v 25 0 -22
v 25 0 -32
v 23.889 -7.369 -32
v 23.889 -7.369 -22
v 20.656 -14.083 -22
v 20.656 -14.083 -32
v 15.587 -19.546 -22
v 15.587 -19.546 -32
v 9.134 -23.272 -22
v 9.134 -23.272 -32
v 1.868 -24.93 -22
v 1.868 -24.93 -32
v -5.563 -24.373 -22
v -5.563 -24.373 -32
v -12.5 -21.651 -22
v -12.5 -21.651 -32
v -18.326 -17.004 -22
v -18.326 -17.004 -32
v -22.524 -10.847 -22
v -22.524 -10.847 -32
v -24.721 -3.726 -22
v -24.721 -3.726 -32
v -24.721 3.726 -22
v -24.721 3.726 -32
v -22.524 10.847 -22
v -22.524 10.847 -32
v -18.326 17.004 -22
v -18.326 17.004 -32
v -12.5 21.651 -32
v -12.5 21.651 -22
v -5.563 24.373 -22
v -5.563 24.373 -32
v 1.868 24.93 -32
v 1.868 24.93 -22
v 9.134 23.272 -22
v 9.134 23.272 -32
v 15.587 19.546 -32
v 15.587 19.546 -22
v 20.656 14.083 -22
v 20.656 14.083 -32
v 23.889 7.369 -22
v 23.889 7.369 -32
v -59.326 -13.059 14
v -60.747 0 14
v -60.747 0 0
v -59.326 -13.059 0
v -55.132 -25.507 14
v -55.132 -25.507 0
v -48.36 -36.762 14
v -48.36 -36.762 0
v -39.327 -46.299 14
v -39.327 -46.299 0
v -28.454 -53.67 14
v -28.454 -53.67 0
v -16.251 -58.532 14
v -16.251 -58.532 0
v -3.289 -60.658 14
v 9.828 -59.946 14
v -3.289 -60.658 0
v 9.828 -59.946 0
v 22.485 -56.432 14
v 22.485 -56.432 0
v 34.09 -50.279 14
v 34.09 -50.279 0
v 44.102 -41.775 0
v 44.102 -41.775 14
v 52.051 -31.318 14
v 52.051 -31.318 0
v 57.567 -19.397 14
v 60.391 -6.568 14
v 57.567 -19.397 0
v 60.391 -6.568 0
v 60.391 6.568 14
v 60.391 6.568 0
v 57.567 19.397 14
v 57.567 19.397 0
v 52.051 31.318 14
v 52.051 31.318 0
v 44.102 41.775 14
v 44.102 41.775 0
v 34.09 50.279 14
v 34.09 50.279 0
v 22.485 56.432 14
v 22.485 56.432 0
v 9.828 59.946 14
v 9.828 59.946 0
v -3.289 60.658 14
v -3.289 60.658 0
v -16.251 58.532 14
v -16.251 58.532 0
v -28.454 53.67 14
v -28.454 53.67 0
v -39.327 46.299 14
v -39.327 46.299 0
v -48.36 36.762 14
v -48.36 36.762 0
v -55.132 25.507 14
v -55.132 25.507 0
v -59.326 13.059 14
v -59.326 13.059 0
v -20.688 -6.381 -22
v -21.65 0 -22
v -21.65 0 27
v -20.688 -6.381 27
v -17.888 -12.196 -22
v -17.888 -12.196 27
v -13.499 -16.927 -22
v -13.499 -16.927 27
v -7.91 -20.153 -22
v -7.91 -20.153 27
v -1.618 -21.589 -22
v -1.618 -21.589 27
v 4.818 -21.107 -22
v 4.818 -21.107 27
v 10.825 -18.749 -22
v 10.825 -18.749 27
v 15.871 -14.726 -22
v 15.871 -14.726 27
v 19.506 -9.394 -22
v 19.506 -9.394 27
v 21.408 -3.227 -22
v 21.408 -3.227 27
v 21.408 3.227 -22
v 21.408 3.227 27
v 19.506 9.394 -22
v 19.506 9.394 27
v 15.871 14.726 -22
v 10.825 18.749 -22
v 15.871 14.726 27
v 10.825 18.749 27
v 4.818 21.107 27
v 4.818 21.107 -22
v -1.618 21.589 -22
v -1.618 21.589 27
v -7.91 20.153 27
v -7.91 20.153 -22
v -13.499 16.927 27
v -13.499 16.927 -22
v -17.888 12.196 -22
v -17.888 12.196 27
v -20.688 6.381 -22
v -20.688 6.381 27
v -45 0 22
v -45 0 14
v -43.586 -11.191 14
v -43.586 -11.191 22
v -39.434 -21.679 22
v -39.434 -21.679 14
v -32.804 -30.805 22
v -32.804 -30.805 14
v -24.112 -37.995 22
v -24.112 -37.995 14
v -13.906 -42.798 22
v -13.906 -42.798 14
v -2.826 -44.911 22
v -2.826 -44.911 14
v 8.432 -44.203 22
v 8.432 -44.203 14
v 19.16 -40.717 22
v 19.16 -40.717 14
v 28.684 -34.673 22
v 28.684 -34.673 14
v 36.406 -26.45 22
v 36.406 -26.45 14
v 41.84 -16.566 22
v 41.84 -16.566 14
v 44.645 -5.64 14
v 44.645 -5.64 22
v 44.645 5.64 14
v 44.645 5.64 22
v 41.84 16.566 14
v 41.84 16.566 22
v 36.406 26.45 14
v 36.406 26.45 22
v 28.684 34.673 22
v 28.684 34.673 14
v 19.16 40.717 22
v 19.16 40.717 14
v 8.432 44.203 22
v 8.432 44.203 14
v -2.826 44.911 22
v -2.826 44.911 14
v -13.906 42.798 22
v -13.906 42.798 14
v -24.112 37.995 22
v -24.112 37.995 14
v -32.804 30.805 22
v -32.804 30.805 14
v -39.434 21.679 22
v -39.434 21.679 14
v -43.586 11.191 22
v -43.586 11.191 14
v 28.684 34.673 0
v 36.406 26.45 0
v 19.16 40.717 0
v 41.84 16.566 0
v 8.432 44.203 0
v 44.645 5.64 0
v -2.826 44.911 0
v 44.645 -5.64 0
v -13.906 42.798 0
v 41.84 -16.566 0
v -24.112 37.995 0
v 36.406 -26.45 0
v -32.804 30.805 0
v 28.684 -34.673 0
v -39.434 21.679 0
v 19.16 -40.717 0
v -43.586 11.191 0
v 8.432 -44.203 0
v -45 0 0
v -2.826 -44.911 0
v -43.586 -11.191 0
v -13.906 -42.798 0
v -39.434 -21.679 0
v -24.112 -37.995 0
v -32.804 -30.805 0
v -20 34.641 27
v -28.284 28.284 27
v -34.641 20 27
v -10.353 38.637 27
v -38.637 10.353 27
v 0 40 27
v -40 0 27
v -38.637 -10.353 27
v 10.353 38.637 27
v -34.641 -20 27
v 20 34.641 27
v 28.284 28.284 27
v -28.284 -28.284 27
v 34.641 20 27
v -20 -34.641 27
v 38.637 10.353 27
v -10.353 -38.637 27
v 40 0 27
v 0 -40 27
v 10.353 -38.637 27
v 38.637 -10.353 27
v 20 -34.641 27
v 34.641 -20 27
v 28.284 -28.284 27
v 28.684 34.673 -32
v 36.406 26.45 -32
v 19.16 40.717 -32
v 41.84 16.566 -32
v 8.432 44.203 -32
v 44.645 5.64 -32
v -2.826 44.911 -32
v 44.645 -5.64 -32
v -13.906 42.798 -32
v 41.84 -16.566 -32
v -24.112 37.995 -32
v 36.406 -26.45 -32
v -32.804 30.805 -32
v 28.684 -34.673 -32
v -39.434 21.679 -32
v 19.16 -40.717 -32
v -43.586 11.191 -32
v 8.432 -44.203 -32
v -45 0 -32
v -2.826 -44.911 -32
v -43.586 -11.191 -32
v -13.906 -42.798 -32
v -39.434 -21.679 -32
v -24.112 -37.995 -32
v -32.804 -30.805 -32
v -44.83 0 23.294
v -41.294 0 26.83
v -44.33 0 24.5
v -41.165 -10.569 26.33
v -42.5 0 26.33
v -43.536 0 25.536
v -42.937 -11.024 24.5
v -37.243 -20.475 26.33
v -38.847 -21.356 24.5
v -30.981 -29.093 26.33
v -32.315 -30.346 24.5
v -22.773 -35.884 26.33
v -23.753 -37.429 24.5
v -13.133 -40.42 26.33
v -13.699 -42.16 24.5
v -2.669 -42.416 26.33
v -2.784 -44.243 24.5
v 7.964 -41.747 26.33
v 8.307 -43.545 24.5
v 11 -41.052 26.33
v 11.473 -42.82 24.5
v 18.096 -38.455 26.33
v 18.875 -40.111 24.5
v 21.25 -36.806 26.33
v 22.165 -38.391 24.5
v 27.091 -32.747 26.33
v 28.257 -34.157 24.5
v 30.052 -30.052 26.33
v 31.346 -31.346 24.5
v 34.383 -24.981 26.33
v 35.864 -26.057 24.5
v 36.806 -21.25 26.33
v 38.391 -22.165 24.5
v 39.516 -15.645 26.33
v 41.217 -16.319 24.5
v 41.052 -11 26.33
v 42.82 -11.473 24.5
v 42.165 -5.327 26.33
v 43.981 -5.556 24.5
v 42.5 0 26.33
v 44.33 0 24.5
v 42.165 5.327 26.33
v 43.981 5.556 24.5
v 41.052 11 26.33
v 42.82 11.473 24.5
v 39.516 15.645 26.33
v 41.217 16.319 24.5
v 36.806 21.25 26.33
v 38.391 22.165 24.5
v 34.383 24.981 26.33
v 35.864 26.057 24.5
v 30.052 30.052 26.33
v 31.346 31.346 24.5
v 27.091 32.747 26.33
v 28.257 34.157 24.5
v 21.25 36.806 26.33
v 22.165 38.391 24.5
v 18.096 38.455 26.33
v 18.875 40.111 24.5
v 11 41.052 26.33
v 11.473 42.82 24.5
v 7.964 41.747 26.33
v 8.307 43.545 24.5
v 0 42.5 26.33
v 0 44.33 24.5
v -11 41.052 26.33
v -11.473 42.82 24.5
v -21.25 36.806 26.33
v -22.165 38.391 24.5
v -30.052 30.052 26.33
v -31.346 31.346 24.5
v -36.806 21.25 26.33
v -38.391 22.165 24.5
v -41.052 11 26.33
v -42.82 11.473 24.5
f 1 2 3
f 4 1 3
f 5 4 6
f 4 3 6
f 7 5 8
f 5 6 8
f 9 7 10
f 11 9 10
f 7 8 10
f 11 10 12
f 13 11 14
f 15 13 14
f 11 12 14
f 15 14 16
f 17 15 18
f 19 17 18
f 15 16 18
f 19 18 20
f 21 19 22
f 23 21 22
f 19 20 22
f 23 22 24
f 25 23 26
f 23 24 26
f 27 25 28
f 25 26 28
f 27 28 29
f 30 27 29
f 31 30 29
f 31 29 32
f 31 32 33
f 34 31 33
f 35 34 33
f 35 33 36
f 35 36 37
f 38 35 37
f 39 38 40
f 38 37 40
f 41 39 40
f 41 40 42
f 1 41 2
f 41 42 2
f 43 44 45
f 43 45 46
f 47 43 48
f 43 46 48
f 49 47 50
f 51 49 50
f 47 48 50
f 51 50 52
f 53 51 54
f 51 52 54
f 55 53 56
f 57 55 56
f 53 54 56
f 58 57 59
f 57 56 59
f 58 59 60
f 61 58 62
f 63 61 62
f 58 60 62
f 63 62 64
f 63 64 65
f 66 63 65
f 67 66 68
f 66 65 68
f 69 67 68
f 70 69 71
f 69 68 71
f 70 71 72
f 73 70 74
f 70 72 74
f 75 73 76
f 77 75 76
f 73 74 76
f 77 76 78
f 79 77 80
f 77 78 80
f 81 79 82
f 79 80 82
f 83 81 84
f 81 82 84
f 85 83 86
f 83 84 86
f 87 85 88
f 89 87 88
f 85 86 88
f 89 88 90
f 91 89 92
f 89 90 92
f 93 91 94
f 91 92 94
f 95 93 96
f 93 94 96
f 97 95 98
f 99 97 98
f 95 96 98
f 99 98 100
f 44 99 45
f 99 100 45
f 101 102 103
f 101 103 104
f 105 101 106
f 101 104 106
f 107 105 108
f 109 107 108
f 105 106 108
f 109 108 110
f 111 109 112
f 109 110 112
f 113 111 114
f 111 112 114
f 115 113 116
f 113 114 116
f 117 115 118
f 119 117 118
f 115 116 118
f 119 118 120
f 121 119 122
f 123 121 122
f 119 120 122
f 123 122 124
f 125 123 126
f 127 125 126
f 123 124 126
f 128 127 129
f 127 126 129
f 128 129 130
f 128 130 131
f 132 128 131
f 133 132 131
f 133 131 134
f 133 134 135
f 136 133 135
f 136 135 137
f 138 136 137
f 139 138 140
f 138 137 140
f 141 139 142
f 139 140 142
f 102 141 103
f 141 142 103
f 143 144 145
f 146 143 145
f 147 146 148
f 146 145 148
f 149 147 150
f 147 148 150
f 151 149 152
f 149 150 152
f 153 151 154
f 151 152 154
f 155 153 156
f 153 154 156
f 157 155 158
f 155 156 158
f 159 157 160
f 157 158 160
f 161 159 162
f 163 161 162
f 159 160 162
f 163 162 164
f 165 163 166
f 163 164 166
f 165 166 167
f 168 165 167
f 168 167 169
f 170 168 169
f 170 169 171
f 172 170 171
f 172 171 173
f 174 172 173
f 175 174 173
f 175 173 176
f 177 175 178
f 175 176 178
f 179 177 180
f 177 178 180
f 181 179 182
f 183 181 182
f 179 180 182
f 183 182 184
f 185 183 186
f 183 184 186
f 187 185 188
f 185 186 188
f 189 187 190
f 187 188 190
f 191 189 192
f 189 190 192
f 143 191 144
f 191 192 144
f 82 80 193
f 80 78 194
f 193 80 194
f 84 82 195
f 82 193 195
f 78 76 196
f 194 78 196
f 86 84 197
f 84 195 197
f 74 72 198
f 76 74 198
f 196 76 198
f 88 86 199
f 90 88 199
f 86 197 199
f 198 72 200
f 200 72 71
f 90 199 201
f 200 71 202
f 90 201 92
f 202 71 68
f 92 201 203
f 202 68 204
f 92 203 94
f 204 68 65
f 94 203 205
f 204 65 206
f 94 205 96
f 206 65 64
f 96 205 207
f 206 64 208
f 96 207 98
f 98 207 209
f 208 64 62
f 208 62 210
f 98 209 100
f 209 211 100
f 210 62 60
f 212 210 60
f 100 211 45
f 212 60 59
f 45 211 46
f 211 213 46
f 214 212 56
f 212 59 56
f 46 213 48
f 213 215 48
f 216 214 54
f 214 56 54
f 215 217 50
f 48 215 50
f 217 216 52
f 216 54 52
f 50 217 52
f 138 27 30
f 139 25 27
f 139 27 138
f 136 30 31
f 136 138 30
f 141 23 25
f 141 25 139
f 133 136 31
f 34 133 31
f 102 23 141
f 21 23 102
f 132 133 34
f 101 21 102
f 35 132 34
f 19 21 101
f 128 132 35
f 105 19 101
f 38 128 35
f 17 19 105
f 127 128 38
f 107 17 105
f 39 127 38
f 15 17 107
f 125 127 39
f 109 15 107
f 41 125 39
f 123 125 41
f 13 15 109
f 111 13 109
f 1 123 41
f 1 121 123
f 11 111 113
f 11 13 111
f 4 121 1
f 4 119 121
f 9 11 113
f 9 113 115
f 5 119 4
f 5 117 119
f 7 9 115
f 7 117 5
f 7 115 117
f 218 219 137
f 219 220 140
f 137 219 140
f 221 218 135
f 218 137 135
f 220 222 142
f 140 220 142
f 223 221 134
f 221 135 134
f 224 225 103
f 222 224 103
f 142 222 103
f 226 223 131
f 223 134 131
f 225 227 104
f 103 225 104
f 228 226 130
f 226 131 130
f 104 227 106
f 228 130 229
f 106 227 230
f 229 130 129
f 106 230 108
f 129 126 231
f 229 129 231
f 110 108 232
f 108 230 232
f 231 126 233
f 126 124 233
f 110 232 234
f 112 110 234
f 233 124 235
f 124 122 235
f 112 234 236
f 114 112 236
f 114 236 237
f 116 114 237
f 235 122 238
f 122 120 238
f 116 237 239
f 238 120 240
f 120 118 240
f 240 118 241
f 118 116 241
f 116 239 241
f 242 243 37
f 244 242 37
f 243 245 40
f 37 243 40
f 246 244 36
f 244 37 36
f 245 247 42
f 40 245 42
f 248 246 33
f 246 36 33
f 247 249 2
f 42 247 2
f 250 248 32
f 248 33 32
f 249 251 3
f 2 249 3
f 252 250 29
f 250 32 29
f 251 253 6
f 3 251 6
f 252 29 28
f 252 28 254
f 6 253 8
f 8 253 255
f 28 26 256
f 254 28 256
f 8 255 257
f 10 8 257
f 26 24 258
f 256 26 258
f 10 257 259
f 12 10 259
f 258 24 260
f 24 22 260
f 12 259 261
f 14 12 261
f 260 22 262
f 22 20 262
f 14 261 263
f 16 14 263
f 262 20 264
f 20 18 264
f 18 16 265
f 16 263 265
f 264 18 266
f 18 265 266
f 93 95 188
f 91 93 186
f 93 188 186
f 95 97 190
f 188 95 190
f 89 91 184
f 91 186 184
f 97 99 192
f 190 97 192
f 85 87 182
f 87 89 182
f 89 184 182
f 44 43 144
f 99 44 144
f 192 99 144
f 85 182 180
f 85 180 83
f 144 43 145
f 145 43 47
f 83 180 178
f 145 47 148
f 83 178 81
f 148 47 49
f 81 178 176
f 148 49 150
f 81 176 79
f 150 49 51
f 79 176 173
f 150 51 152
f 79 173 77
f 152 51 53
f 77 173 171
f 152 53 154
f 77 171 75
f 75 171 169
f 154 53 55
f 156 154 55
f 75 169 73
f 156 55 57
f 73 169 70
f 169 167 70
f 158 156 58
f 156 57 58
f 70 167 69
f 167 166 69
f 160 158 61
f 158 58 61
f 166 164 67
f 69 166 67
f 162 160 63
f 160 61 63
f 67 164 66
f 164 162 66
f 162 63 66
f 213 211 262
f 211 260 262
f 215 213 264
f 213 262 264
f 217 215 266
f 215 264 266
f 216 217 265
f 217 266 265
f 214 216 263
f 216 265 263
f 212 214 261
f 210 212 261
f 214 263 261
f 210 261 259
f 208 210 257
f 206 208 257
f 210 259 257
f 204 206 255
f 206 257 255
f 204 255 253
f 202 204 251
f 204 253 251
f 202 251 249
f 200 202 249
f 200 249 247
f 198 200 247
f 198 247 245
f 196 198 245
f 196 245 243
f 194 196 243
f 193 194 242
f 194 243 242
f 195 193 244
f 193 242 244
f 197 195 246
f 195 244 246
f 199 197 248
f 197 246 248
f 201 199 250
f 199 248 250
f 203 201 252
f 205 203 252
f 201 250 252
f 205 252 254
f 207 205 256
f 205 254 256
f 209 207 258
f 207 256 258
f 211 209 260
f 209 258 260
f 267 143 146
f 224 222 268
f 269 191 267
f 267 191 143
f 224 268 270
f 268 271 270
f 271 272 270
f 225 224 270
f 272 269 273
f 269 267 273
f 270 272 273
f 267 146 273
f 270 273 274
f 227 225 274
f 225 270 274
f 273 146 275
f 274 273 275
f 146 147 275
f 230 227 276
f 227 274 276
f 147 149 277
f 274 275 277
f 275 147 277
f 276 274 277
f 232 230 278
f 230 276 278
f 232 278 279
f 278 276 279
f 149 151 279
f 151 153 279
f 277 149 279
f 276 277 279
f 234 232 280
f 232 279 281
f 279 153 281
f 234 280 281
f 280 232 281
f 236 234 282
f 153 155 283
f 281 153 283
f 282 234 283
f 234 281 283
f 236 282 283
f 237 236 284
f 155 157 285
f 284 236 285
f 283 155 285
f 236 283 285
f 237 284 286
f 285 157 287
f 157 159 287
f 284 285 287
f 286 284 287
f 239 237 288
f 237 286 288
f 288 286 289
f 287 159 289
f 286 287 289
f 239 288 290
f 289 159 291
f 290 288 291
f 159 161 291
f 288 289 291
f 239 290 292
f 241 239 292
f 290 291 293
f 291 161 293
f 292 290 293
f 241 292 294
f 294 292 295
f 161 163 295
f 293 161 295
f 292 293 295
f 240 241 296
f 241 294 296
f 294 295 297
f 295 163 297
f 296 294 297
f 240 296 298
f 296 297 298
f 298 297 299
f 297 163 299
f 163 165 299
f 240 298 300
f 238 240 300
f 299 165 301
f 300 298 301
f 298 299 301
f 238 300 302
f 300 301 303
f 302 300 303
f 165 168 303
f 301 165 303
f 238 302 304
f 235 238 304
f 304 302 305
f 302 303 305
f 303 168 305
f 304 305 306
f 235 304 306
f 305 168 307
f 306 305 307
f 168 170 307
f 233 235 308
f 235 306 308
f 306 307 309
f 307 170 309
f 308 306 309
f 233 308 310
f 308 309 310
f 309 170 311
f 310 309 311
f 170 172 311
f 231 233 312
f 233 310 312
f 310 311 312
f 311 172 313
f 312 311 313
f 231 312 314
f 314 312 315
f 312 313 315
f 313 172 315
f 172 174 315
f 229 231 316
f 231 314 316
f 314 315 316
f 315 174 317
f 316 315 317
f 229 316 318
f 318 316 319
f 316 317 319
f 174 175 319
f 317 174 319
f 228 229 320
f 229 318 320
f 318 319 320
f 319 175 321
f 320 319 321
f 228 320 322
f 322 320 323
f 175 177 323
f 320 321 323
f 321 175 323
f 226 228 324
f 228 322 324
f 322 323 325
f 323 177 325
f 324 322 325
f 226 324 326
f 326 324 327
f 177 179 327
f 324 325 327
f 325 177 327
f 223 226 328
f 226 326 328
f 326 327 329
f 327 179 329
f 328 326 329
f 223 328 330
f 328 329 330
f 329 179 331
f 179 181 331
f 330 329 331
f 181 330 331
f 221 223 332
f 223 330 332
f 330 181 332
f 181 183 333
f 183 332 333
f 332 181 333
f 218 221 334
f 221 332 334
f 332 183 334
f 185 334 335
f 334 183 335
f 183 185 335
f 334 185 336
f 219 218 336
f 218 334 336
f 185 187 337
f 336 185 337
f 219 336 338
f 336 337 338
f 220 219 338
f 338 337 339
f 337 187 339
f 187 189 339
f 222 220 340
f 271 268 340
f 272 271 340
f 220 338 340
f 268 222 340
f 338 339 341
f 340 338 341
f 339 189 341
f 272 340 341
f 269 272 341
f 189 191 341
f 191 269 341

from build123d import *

# Parameters (mm, degrees)
F2_R     = 5
F3_R     = 25
F4_DEPTH = 10


with BuildPart() as f1:
    # F0 (on Front) → F1 (revolve)
    with BuildSketch(Plane.XZ):
        Polygon((-60.746692, 14), (-60.746692, 0), (-45, 0), (-45, -32), (-21.65, -32), (-21.65, 27), (-45, 27), (-45, 14), align=None)
    revolve(axis=Axis((0, 0, 28.312229), (0, 0, 1)))

    # F2
    f2_edges = [f1.edges().sort_by_distance(p)[0] for p in [
        (45, 0, 27),
    ]]
    fillet(f2_edges, radius=F2_R)

    # F3 (on face) → F4 (cut)
    with BuildSketch(Plane(origin=(0, 0, -32), x_dir=(1, 0, 0), z_dir=(0, 0, -1))):
        Circle(F3_R)
    extrude(amount=-F4_DEPTH, mode=Mode.SUBTRACT)


solid = f1.part
